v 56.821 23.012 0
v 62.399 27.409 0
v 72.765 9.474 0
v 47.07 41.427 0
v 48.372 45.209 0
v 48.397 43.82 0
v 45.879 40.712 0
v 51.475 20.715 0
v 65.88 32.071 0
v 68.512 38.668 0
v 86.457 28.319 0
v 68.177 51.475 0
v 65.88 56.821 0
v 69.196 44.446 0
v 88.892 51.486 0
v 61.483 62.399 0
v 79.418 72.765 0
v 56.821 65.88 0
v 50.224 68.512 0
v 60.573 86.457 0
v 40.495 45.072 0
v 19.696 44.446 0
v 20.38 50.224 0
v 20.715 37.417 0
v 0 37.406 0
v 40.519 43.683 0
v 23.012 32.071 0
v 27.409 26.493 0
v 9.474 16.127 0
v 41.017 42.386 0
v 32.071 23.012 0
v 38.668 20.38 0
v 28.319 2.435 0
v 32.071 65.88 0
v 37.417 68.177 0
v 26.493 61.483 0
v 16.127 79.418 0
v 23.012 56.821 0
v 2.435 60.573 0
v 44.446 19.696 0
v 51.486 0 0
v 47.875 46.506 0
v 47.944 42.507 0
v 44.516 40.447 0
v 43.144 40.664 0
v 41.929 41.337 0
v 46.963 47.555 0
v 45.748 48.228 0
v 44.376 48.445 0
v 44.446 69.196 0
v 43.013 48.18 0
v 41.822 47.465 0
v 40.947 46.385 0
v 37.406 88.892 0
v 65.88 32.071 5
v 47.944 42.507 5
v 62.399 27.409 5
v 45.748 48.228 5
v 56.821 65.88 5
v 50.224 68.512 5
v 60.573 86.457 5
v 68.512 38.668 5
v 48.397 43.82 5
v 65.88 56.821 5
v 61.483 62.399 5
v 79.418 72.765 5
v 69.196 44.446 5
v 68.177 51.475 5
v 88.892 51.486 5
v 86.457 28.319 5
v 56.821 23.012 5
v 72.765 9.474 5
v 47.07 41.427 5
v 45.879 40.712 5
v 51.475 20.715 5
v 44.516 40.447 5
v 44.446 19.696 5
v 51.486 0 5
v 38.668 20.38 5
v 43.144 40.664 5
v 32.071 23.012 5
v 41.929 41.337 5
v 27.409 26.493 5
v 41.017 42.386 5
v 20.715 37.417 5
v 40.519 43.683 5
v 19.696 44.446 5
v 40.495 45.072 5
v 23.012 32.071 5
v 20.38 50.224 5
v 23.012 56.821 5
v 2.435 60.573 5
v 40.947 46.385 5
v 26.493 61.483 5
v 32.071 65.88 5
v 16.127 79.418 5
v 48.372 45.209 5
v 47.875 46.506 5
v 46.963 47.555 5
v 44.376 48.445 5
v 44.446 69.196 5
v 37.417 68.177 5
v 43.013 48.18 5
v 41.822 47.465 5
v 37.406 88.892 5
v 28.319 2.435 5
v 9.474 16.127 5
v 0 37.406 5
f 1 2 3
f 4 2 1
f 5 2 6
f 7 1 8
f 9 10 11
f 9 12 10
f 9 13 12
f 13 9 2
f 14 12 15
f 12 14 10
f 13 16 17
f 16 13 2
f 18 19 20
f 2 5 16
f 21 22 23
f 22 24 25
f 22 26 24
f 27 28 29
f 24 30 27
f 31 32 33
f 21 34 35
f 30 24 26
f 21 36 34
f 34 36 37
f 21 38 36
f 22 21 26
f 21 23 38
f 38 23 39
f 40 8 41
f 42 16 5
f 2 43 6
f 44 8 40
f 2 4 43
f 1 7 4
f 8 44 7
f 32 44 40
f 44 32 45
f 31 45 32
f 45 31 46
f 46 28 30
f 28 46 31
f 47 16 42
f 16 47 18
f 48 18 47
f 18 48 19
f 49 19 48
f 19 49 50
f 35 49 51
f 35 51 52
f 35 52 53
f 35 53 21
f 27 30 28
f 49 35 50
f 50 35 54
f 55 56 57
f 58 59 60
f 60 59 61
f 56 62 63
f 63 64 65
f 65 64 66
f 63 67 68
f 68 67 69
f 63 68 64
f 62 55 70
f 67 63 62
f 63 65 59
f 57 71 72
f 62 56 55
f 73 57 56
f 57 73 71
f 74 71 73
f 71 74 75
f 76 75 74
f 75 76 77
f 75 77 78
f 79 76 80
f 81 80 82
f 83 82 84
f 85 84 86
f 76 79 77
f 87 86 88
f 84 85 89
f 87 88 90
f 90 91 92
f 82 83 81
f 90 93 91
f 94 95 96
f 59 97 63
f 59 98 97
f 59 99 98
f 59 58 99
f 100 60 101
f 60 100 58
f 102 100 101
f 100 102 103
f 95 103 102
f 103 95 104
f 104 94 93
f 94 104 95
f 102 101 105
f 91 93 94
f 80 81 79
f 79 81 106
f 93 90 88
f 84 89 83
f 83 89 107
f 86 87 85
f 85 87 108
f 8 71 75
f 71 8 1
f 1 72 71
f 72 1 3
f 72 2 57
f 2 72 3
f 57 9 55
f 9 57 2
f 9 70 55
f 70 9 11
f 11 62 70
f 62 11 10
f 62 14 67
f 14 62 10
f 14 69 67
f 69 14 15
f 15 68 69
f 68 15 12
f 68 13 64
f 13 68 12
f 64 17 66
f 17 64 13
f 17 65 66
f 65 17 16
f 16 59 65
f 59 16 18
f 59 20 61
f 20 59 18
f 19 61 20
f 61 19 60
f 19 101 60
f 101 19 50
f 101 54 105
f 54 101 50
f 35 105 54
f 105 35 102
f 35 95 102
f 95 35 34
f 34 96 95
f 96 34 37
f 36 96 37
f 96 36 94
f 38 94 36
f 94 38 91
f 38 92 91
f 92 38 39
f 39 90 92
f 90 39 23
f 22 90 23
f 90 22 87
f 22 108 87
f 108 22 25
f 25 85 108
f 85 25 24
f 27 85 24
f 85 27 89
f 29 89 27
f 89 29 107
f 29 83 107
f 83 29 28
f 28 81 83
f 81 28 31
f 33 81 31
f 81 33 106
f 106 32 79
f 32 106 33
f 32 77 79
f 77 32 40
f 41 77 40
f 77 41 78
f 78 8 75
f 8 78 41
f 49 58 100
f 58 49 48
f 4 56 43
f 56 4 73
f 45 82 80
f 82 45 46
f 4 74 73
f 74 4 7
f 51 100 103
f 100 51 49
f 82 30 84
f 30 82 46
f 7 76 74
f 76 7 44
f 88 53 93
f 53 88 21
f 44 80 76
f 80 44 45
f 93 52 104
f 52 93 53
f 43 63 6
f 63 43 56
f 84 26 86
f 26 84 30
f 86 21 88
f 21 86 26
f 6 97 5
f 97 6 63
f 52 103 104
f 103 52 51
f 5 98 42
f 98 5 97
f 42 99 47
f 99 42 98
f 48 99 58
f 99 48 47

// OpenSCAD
$fn = 32;

// ----------------------------------------------------------------------
// Star wheel: 12-point ratchet, R45
// ----------------------------------------------------------------------

// --- parameters (mm) ---
n_points = 12;            // number of points / teeth
r_out = 45;               // tip radius
r_in = 24.75;             // root radius
bore_r = 4;               // centre bore radius
plate_t = 5;              // plate thickness, Z (extrusion height)
bore_d = 8;               // centre bore diameter

profile = [[44.446, 69.196], [37.406, 88.892], [37.417, 68.177], [32.071, 65.88], [16.127, 79.418], [26.493, 61.483], [23.012, 56.821], [2.435, 60.573], [20.38, 50.224], [19.696, 44.446], [0, 37.406], [20.715, 37.417], [23.012, 32.071], [9.474, 16.127], [27.409, 26.493], [32.071, 23.012], [28.319, 2.435], [38.668, 20.38], [44.446, 19.696], [51.486, 0], [51.475, 20.715], [56.821, 23.012], [72.765, 9.474], [62.399, 27.409], [65.88, 32.071], [86.457, 28.319], [68.512, 38.668], [69.196, 44.446], [88.892, 51.486], [68.177, 51.475], [65.88, 56.821], [79.418, 72.765], [61.483, 62.399], [56.821, 65.88], [60.573, 86.457], [50.224, 68.512]];  // primary outline, 36 points, counter clockwise
void_1 = [[48.372, 45.209], [47.875, 46.506], [46.963, 47.555], [45.748, 48.228], [44.376, 48.445], [43.013, 48.18], [41.822, 47.465], [40.947, 46.385], [40.495, 45.072], [40.519, 43.683], [41.017, 42.386], [41.929, 41.337], [43.144, 40.664], [44.516, 40.447], [45.879, 40.712], [47.07, 41.427], [47.944, 42.507], [48.397, 43.82]];  // centre bore, 18 points

// --- the one profile operation ---
difference() {
  linear_extrude(height = plate_t) polygon(points = profile);
  translate([0, 0, -1])
    linear_extrude(height = plate_t + 2) polygon(points = void_1);
}
